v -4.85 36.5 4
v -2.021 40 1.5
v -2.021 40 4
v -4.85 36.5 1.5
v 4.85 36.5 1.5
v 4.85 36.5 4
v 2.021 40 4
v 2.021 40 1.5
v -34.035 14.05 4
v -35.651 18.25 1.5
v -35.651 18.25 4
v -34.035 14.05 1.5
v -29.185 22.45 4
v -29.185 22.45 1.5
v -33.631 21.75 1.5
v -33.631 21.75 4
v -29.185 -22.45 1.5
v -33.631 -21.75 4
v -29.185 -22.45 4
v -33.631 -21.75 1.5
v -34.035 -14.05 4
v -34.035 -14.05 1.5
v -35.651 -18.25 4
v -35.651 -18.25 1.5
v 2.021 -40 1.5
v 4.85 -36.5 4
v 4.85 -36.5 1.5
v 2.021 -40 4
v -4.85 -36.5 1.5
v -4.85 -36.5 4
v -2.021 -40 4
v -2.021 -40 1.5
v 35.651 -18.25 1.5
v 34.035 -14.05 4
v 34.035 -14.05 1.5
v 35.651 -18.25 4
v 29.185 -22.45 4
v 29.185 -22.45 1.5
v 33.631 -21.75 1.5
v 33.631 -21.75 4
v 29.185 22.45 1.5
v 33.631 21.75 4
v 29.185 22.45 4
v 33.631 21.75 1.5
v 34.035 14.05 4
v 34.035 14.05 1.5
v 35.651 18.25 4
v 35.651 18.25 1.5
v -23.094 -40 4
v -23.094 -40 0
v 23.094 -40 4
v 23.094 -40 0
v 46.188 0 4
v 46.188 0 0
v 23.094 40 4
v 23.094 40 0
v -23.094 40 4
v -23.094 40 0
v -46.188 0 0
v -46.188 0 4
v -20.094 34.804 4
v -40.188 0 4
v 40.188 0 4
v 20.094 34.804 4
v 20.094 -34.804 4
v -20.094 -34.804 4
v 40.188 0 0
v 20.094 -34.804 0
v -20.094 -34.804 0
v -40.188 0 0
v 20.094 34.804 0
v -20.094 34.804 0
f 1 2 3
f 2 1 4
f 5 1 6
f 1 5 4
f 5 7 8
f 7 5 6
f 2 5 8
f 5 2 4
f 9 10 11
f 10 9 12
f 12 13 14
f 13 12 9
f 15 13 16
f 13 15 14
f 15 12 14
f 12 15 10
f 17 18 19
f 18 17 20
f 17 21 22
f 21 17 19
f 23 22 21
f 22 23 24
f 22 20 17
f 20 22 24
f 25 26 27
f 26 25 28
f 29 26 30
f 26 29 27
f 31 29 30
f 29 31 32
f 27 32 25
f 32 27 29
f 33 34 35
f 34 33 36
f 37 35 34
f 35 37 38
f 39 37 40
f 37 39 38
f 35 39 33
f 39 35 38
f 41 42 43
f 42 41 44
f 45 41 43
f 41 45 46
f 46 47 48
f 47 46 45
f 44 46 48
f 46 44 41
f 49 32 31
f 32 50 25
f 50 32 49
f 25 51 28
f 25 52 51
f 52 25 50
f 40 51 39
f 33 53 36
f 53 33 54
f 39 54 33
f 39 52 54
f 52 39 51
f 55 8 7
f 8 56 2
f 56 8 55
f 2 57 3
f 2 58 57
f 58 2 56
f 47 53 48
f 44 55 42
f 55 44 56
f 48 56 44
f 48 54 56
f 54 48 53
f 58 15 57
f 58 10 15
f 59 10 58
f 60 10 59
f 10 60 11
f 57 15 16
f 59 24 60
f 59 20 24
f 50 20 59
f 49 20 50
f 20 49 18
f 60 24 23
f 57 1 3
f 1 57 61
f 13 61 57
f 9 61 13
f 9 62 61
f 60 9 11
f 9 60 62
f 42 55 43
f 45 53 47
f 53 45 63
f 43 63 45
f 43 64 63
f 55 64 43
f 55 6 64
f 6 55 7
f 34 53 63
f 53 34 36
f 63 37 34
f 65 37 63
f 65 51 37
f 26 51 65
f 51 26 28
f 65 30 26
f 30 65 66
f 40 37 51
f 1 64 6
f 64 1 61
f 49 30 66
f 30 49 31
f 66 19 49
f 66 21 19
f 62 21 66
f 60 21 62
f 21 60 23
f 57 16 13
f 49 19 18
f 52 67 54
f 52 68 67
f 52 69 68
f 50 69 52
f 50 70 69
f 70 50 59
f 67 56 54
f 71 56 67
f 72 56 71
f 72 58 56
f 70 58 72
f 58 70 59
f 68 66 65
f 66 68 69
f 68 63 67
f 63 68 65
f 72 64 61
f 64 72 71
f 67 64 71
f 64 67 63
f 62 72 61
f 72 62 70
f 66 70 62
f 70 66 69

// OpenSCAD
sideD=40;
r=sideD/(sqrt(3)/2);
h=4;
wh=2.5;

// translate([10,0,0]) color("red") rotate([90,0,90]) translate([-sideD,0,-r]) import("hexagon.STL");

difference() {
  cylinder(r=r,h=h,$fn=6);
  translate([0,0,-0.1]) cylinder(r=r-6,h=h+0.2,$fn=6);

  for ( c = [0 : 5] ){ 
    rotate([0,0,c*60]) wedge();
  }
}

module wedge() {
  color("blue") translate([0,40,h-wh]) {
    wedgeHalf();
    rotate([0,0,180]) wedgeHalf();
  }
}

module wedgeHalf() {
  translate([0,-1.5,0]) scale([1.4,1,1]) rotate([0,0,90]) cylinder(r=4,h=wh+0.01,$fn=3);
}
